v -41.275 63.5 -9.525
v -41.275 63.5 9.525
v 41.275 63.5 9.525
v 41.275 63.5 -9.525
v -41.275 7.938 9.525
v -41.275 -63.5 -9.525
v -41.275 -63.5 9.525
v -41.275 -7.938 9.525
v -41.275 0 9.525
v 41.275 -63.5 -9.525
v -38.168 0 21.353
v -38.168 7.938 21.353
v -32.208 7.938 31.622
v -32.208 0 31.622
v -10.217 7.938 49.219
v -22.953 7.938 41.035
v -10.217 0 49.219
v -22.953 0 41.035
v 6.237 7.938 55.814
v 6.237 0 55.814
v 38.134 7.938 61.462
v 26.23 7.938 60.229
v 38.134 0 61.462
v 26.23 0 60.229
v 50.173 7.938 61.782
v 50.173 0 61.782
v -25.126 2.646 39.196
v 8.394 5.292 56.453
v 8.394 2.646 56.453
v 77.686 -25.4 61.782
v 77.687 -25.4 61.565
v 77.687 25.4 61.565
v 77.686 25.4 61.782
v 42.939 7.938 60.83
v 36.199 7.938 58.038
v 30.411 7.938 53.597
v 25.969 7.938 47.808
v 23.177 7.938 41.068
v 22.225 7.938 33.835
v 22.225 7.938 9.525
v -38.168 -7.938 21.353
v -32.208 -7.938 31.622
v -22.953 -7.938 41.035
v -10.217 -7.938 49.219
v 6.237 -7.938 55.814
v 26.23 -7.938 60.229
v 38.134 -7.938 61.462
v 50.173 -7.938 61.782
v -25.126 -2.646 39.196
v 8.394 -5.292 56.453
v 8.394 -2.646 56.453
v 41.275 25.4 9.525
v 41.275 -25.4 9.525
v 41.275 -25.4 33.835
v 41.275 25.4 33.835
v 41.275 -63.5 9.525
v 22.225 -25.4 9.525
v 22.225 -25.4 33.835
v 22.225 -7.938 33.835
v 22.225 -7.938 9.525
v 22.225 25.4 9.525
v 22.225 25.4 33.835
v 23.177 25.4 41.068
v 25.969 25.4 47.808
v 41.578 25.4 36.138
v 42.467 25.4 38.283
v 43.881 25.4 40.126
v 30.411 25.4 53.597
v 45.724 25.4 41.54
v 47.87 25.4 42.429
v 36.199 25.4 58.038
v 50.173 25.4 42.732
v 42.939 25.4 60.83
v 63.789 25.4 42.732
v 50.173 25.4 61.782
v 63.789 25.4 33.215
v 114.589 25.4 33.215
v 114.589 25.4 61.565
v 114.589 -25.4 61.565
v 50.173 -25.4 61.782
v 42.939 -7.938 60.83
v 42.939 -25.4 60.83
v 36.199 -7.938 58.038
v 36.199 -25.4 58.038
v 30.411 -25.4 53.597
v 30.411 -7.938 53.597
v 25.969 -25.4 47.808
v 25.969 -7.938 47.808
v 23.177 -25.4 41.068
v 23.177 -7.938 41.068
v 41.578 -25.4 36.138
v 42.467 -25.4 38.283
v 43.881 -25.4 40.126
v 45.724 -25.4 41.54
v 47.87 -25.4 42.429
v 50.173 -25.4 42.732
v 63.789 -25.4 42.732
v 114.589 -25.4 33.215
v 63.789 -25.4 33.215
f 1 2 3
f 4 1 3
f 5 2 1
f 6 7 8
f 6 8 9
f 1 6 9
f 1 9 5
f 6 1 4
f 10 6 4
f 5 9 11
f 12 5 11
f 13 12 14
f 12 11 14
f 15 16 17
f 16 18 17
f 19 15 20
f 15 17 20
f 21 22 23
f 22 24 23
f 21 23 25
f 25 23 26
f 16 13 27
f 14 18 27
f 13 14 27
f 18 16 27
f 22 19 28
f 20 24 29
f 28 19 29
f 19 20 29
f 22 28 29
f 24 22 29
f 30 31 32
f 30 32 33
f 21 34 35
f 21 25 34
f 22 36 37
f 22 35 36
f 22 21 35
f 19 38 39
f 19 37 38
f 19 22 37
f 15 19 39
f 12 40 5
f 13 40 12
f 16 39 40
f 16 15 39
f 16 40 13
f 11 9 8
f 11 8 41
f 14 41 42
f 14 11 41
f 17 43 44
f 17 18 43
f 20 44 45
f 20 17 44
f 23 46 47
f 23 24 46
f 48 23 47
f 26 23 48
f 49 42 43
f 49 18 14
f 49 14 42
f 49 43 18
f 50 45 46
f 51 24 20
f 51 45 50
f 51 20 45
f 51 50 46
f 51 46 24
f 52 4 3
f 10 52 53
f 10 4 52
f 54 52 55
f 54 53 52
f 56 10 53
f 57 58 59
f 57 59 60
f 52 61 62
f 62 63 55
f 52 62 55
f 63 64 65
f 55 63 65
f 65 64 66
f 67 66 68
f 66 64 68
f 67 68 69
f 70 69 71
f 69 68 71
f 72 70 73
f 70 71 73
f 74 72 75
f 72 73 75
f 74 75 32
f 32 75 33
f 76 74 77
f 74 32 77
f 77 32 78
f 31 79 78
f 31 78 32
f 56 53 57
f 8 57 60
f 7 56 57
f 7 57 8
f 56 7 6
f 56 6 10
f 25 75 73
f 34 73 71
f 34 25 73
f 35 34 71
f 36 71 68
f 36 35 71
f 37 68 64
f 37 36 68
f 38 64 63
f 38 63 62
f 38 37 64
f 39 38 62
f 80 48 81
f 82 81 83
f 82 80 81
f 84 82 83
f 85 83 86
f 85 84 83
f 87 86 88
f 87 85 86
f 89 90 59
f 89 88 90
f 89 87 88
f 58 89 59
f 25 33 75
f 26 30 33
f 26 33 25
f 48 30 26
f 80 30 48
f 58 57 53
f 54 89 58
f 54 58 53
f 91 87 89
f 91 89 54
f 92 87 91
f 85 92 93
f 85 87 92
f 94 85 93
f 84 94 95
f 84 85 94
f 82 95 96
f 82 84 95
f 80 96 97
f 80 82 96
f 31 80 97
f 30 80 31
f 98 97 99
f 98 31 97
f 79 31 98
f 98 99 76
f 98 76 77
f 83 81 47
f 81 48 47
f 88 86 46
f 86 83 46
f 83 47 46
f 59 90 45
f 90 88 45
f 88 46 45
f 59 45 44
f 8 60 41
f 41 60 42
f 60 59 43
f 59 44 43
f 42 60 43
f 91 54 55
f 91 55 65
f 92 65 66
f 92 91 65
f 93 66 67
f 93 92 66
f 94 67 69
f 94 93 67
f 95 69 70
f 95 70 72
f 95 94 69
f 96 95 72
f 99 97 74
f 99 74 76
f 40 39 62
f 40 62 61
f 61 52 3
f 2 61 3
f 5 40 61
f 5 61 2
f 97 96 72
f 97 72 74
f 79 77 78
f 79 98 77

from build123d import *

# Parameters (mm, degrees)
F1_DEPTH = 63.5
F2_DEPTH = 25.4
F3_DEPTH = 7.9375
F4_DEPTH = 25.4


with BuildPart() as f1:
    # F0 (on Front) → F1 (new body, symmetric)
    with BuildSketch(Plane.XZ):
        Polygon((-41.275, 9.525), (-41.275, -9.525), (41.275, -9.525), (41.275, 9.525), (22.225, 9.525), align=None)
    extrude(amount=F1_DEPTH, both=True)

    # F0 (on Front) → F2 (join, symmetric)
    with BuildSketch(Plane.XZ):
        with BuildLine():
            Line((22.225, 9.525), (41.275, 9.525))
            Line((41.275, 9.525), (41.275, 33.834597))
            ThreePointArc((41.275, 33.834597), (43.881091, 40.126257), (50.172751, 42.732348))
            Line((50.172751, 42.732348), (63.788638, 42.732348))
            Line((63.788638, 42.732348), (63.788638, 61.565076))
            Line((63.788638, 61.565076), (77.687105, 61.565076))
            Line((77.687105, 61.565076), (77.685953, 61.782348))
            Line((77.685953, 61.782348), (50.172751, 61.782348))
            ThreePointArc((50.172751, 61.782348), (30.410707, 53.596641), (22.225, 33.834597))
            Line((22.225, 33.834597), (22.225, 9.525))
        make_face()
    extrude(amount=F2_DEPTH, both=True)

    # F0 (on Front) → F3 (join, symmetric)
    with BuildSketch(Plane.XZ):
        with BuildLine():
            add(Edge.make_bspline(
                [(-41.275, 9.525), (-36.848798, 45.56419), (7.302681, 62.255602), (50.172751, 61.782348)],
                knots=[0, 0, 0, 0, 105.325787, 105.325787, 105.325787, 105.325787], degree=3))
            Line((-41.275, 9.525), (22.225, 9.525))
            Line((22.225, 9.525), (22.225, 33.834597))
            ThreePointArc((22.225, 33.834597), (30.410707, 53.596641), (50.172751, 61.782348))
        make_face()
    extrude(amount=F3_DEPTH, both=True)

    # F0 (on Front) → F4 (join, symmetric)
    with BuildSketch(Plane.XZ):
        Polygon((114.588638, 61.565076), (77.687105, 61.565076), (77.837355, 33.214565), (114.588638, 33.214565), align=None)
        Polygon((77.837355, 33.214565), (77.687105, 61.565076), (63.788638, 61.565076), (63.788638, 42.732348), (63.788638, 33.214565), align=None)
    extrude(amount=F4_DEPTH, both=True)


solid = f1.part
